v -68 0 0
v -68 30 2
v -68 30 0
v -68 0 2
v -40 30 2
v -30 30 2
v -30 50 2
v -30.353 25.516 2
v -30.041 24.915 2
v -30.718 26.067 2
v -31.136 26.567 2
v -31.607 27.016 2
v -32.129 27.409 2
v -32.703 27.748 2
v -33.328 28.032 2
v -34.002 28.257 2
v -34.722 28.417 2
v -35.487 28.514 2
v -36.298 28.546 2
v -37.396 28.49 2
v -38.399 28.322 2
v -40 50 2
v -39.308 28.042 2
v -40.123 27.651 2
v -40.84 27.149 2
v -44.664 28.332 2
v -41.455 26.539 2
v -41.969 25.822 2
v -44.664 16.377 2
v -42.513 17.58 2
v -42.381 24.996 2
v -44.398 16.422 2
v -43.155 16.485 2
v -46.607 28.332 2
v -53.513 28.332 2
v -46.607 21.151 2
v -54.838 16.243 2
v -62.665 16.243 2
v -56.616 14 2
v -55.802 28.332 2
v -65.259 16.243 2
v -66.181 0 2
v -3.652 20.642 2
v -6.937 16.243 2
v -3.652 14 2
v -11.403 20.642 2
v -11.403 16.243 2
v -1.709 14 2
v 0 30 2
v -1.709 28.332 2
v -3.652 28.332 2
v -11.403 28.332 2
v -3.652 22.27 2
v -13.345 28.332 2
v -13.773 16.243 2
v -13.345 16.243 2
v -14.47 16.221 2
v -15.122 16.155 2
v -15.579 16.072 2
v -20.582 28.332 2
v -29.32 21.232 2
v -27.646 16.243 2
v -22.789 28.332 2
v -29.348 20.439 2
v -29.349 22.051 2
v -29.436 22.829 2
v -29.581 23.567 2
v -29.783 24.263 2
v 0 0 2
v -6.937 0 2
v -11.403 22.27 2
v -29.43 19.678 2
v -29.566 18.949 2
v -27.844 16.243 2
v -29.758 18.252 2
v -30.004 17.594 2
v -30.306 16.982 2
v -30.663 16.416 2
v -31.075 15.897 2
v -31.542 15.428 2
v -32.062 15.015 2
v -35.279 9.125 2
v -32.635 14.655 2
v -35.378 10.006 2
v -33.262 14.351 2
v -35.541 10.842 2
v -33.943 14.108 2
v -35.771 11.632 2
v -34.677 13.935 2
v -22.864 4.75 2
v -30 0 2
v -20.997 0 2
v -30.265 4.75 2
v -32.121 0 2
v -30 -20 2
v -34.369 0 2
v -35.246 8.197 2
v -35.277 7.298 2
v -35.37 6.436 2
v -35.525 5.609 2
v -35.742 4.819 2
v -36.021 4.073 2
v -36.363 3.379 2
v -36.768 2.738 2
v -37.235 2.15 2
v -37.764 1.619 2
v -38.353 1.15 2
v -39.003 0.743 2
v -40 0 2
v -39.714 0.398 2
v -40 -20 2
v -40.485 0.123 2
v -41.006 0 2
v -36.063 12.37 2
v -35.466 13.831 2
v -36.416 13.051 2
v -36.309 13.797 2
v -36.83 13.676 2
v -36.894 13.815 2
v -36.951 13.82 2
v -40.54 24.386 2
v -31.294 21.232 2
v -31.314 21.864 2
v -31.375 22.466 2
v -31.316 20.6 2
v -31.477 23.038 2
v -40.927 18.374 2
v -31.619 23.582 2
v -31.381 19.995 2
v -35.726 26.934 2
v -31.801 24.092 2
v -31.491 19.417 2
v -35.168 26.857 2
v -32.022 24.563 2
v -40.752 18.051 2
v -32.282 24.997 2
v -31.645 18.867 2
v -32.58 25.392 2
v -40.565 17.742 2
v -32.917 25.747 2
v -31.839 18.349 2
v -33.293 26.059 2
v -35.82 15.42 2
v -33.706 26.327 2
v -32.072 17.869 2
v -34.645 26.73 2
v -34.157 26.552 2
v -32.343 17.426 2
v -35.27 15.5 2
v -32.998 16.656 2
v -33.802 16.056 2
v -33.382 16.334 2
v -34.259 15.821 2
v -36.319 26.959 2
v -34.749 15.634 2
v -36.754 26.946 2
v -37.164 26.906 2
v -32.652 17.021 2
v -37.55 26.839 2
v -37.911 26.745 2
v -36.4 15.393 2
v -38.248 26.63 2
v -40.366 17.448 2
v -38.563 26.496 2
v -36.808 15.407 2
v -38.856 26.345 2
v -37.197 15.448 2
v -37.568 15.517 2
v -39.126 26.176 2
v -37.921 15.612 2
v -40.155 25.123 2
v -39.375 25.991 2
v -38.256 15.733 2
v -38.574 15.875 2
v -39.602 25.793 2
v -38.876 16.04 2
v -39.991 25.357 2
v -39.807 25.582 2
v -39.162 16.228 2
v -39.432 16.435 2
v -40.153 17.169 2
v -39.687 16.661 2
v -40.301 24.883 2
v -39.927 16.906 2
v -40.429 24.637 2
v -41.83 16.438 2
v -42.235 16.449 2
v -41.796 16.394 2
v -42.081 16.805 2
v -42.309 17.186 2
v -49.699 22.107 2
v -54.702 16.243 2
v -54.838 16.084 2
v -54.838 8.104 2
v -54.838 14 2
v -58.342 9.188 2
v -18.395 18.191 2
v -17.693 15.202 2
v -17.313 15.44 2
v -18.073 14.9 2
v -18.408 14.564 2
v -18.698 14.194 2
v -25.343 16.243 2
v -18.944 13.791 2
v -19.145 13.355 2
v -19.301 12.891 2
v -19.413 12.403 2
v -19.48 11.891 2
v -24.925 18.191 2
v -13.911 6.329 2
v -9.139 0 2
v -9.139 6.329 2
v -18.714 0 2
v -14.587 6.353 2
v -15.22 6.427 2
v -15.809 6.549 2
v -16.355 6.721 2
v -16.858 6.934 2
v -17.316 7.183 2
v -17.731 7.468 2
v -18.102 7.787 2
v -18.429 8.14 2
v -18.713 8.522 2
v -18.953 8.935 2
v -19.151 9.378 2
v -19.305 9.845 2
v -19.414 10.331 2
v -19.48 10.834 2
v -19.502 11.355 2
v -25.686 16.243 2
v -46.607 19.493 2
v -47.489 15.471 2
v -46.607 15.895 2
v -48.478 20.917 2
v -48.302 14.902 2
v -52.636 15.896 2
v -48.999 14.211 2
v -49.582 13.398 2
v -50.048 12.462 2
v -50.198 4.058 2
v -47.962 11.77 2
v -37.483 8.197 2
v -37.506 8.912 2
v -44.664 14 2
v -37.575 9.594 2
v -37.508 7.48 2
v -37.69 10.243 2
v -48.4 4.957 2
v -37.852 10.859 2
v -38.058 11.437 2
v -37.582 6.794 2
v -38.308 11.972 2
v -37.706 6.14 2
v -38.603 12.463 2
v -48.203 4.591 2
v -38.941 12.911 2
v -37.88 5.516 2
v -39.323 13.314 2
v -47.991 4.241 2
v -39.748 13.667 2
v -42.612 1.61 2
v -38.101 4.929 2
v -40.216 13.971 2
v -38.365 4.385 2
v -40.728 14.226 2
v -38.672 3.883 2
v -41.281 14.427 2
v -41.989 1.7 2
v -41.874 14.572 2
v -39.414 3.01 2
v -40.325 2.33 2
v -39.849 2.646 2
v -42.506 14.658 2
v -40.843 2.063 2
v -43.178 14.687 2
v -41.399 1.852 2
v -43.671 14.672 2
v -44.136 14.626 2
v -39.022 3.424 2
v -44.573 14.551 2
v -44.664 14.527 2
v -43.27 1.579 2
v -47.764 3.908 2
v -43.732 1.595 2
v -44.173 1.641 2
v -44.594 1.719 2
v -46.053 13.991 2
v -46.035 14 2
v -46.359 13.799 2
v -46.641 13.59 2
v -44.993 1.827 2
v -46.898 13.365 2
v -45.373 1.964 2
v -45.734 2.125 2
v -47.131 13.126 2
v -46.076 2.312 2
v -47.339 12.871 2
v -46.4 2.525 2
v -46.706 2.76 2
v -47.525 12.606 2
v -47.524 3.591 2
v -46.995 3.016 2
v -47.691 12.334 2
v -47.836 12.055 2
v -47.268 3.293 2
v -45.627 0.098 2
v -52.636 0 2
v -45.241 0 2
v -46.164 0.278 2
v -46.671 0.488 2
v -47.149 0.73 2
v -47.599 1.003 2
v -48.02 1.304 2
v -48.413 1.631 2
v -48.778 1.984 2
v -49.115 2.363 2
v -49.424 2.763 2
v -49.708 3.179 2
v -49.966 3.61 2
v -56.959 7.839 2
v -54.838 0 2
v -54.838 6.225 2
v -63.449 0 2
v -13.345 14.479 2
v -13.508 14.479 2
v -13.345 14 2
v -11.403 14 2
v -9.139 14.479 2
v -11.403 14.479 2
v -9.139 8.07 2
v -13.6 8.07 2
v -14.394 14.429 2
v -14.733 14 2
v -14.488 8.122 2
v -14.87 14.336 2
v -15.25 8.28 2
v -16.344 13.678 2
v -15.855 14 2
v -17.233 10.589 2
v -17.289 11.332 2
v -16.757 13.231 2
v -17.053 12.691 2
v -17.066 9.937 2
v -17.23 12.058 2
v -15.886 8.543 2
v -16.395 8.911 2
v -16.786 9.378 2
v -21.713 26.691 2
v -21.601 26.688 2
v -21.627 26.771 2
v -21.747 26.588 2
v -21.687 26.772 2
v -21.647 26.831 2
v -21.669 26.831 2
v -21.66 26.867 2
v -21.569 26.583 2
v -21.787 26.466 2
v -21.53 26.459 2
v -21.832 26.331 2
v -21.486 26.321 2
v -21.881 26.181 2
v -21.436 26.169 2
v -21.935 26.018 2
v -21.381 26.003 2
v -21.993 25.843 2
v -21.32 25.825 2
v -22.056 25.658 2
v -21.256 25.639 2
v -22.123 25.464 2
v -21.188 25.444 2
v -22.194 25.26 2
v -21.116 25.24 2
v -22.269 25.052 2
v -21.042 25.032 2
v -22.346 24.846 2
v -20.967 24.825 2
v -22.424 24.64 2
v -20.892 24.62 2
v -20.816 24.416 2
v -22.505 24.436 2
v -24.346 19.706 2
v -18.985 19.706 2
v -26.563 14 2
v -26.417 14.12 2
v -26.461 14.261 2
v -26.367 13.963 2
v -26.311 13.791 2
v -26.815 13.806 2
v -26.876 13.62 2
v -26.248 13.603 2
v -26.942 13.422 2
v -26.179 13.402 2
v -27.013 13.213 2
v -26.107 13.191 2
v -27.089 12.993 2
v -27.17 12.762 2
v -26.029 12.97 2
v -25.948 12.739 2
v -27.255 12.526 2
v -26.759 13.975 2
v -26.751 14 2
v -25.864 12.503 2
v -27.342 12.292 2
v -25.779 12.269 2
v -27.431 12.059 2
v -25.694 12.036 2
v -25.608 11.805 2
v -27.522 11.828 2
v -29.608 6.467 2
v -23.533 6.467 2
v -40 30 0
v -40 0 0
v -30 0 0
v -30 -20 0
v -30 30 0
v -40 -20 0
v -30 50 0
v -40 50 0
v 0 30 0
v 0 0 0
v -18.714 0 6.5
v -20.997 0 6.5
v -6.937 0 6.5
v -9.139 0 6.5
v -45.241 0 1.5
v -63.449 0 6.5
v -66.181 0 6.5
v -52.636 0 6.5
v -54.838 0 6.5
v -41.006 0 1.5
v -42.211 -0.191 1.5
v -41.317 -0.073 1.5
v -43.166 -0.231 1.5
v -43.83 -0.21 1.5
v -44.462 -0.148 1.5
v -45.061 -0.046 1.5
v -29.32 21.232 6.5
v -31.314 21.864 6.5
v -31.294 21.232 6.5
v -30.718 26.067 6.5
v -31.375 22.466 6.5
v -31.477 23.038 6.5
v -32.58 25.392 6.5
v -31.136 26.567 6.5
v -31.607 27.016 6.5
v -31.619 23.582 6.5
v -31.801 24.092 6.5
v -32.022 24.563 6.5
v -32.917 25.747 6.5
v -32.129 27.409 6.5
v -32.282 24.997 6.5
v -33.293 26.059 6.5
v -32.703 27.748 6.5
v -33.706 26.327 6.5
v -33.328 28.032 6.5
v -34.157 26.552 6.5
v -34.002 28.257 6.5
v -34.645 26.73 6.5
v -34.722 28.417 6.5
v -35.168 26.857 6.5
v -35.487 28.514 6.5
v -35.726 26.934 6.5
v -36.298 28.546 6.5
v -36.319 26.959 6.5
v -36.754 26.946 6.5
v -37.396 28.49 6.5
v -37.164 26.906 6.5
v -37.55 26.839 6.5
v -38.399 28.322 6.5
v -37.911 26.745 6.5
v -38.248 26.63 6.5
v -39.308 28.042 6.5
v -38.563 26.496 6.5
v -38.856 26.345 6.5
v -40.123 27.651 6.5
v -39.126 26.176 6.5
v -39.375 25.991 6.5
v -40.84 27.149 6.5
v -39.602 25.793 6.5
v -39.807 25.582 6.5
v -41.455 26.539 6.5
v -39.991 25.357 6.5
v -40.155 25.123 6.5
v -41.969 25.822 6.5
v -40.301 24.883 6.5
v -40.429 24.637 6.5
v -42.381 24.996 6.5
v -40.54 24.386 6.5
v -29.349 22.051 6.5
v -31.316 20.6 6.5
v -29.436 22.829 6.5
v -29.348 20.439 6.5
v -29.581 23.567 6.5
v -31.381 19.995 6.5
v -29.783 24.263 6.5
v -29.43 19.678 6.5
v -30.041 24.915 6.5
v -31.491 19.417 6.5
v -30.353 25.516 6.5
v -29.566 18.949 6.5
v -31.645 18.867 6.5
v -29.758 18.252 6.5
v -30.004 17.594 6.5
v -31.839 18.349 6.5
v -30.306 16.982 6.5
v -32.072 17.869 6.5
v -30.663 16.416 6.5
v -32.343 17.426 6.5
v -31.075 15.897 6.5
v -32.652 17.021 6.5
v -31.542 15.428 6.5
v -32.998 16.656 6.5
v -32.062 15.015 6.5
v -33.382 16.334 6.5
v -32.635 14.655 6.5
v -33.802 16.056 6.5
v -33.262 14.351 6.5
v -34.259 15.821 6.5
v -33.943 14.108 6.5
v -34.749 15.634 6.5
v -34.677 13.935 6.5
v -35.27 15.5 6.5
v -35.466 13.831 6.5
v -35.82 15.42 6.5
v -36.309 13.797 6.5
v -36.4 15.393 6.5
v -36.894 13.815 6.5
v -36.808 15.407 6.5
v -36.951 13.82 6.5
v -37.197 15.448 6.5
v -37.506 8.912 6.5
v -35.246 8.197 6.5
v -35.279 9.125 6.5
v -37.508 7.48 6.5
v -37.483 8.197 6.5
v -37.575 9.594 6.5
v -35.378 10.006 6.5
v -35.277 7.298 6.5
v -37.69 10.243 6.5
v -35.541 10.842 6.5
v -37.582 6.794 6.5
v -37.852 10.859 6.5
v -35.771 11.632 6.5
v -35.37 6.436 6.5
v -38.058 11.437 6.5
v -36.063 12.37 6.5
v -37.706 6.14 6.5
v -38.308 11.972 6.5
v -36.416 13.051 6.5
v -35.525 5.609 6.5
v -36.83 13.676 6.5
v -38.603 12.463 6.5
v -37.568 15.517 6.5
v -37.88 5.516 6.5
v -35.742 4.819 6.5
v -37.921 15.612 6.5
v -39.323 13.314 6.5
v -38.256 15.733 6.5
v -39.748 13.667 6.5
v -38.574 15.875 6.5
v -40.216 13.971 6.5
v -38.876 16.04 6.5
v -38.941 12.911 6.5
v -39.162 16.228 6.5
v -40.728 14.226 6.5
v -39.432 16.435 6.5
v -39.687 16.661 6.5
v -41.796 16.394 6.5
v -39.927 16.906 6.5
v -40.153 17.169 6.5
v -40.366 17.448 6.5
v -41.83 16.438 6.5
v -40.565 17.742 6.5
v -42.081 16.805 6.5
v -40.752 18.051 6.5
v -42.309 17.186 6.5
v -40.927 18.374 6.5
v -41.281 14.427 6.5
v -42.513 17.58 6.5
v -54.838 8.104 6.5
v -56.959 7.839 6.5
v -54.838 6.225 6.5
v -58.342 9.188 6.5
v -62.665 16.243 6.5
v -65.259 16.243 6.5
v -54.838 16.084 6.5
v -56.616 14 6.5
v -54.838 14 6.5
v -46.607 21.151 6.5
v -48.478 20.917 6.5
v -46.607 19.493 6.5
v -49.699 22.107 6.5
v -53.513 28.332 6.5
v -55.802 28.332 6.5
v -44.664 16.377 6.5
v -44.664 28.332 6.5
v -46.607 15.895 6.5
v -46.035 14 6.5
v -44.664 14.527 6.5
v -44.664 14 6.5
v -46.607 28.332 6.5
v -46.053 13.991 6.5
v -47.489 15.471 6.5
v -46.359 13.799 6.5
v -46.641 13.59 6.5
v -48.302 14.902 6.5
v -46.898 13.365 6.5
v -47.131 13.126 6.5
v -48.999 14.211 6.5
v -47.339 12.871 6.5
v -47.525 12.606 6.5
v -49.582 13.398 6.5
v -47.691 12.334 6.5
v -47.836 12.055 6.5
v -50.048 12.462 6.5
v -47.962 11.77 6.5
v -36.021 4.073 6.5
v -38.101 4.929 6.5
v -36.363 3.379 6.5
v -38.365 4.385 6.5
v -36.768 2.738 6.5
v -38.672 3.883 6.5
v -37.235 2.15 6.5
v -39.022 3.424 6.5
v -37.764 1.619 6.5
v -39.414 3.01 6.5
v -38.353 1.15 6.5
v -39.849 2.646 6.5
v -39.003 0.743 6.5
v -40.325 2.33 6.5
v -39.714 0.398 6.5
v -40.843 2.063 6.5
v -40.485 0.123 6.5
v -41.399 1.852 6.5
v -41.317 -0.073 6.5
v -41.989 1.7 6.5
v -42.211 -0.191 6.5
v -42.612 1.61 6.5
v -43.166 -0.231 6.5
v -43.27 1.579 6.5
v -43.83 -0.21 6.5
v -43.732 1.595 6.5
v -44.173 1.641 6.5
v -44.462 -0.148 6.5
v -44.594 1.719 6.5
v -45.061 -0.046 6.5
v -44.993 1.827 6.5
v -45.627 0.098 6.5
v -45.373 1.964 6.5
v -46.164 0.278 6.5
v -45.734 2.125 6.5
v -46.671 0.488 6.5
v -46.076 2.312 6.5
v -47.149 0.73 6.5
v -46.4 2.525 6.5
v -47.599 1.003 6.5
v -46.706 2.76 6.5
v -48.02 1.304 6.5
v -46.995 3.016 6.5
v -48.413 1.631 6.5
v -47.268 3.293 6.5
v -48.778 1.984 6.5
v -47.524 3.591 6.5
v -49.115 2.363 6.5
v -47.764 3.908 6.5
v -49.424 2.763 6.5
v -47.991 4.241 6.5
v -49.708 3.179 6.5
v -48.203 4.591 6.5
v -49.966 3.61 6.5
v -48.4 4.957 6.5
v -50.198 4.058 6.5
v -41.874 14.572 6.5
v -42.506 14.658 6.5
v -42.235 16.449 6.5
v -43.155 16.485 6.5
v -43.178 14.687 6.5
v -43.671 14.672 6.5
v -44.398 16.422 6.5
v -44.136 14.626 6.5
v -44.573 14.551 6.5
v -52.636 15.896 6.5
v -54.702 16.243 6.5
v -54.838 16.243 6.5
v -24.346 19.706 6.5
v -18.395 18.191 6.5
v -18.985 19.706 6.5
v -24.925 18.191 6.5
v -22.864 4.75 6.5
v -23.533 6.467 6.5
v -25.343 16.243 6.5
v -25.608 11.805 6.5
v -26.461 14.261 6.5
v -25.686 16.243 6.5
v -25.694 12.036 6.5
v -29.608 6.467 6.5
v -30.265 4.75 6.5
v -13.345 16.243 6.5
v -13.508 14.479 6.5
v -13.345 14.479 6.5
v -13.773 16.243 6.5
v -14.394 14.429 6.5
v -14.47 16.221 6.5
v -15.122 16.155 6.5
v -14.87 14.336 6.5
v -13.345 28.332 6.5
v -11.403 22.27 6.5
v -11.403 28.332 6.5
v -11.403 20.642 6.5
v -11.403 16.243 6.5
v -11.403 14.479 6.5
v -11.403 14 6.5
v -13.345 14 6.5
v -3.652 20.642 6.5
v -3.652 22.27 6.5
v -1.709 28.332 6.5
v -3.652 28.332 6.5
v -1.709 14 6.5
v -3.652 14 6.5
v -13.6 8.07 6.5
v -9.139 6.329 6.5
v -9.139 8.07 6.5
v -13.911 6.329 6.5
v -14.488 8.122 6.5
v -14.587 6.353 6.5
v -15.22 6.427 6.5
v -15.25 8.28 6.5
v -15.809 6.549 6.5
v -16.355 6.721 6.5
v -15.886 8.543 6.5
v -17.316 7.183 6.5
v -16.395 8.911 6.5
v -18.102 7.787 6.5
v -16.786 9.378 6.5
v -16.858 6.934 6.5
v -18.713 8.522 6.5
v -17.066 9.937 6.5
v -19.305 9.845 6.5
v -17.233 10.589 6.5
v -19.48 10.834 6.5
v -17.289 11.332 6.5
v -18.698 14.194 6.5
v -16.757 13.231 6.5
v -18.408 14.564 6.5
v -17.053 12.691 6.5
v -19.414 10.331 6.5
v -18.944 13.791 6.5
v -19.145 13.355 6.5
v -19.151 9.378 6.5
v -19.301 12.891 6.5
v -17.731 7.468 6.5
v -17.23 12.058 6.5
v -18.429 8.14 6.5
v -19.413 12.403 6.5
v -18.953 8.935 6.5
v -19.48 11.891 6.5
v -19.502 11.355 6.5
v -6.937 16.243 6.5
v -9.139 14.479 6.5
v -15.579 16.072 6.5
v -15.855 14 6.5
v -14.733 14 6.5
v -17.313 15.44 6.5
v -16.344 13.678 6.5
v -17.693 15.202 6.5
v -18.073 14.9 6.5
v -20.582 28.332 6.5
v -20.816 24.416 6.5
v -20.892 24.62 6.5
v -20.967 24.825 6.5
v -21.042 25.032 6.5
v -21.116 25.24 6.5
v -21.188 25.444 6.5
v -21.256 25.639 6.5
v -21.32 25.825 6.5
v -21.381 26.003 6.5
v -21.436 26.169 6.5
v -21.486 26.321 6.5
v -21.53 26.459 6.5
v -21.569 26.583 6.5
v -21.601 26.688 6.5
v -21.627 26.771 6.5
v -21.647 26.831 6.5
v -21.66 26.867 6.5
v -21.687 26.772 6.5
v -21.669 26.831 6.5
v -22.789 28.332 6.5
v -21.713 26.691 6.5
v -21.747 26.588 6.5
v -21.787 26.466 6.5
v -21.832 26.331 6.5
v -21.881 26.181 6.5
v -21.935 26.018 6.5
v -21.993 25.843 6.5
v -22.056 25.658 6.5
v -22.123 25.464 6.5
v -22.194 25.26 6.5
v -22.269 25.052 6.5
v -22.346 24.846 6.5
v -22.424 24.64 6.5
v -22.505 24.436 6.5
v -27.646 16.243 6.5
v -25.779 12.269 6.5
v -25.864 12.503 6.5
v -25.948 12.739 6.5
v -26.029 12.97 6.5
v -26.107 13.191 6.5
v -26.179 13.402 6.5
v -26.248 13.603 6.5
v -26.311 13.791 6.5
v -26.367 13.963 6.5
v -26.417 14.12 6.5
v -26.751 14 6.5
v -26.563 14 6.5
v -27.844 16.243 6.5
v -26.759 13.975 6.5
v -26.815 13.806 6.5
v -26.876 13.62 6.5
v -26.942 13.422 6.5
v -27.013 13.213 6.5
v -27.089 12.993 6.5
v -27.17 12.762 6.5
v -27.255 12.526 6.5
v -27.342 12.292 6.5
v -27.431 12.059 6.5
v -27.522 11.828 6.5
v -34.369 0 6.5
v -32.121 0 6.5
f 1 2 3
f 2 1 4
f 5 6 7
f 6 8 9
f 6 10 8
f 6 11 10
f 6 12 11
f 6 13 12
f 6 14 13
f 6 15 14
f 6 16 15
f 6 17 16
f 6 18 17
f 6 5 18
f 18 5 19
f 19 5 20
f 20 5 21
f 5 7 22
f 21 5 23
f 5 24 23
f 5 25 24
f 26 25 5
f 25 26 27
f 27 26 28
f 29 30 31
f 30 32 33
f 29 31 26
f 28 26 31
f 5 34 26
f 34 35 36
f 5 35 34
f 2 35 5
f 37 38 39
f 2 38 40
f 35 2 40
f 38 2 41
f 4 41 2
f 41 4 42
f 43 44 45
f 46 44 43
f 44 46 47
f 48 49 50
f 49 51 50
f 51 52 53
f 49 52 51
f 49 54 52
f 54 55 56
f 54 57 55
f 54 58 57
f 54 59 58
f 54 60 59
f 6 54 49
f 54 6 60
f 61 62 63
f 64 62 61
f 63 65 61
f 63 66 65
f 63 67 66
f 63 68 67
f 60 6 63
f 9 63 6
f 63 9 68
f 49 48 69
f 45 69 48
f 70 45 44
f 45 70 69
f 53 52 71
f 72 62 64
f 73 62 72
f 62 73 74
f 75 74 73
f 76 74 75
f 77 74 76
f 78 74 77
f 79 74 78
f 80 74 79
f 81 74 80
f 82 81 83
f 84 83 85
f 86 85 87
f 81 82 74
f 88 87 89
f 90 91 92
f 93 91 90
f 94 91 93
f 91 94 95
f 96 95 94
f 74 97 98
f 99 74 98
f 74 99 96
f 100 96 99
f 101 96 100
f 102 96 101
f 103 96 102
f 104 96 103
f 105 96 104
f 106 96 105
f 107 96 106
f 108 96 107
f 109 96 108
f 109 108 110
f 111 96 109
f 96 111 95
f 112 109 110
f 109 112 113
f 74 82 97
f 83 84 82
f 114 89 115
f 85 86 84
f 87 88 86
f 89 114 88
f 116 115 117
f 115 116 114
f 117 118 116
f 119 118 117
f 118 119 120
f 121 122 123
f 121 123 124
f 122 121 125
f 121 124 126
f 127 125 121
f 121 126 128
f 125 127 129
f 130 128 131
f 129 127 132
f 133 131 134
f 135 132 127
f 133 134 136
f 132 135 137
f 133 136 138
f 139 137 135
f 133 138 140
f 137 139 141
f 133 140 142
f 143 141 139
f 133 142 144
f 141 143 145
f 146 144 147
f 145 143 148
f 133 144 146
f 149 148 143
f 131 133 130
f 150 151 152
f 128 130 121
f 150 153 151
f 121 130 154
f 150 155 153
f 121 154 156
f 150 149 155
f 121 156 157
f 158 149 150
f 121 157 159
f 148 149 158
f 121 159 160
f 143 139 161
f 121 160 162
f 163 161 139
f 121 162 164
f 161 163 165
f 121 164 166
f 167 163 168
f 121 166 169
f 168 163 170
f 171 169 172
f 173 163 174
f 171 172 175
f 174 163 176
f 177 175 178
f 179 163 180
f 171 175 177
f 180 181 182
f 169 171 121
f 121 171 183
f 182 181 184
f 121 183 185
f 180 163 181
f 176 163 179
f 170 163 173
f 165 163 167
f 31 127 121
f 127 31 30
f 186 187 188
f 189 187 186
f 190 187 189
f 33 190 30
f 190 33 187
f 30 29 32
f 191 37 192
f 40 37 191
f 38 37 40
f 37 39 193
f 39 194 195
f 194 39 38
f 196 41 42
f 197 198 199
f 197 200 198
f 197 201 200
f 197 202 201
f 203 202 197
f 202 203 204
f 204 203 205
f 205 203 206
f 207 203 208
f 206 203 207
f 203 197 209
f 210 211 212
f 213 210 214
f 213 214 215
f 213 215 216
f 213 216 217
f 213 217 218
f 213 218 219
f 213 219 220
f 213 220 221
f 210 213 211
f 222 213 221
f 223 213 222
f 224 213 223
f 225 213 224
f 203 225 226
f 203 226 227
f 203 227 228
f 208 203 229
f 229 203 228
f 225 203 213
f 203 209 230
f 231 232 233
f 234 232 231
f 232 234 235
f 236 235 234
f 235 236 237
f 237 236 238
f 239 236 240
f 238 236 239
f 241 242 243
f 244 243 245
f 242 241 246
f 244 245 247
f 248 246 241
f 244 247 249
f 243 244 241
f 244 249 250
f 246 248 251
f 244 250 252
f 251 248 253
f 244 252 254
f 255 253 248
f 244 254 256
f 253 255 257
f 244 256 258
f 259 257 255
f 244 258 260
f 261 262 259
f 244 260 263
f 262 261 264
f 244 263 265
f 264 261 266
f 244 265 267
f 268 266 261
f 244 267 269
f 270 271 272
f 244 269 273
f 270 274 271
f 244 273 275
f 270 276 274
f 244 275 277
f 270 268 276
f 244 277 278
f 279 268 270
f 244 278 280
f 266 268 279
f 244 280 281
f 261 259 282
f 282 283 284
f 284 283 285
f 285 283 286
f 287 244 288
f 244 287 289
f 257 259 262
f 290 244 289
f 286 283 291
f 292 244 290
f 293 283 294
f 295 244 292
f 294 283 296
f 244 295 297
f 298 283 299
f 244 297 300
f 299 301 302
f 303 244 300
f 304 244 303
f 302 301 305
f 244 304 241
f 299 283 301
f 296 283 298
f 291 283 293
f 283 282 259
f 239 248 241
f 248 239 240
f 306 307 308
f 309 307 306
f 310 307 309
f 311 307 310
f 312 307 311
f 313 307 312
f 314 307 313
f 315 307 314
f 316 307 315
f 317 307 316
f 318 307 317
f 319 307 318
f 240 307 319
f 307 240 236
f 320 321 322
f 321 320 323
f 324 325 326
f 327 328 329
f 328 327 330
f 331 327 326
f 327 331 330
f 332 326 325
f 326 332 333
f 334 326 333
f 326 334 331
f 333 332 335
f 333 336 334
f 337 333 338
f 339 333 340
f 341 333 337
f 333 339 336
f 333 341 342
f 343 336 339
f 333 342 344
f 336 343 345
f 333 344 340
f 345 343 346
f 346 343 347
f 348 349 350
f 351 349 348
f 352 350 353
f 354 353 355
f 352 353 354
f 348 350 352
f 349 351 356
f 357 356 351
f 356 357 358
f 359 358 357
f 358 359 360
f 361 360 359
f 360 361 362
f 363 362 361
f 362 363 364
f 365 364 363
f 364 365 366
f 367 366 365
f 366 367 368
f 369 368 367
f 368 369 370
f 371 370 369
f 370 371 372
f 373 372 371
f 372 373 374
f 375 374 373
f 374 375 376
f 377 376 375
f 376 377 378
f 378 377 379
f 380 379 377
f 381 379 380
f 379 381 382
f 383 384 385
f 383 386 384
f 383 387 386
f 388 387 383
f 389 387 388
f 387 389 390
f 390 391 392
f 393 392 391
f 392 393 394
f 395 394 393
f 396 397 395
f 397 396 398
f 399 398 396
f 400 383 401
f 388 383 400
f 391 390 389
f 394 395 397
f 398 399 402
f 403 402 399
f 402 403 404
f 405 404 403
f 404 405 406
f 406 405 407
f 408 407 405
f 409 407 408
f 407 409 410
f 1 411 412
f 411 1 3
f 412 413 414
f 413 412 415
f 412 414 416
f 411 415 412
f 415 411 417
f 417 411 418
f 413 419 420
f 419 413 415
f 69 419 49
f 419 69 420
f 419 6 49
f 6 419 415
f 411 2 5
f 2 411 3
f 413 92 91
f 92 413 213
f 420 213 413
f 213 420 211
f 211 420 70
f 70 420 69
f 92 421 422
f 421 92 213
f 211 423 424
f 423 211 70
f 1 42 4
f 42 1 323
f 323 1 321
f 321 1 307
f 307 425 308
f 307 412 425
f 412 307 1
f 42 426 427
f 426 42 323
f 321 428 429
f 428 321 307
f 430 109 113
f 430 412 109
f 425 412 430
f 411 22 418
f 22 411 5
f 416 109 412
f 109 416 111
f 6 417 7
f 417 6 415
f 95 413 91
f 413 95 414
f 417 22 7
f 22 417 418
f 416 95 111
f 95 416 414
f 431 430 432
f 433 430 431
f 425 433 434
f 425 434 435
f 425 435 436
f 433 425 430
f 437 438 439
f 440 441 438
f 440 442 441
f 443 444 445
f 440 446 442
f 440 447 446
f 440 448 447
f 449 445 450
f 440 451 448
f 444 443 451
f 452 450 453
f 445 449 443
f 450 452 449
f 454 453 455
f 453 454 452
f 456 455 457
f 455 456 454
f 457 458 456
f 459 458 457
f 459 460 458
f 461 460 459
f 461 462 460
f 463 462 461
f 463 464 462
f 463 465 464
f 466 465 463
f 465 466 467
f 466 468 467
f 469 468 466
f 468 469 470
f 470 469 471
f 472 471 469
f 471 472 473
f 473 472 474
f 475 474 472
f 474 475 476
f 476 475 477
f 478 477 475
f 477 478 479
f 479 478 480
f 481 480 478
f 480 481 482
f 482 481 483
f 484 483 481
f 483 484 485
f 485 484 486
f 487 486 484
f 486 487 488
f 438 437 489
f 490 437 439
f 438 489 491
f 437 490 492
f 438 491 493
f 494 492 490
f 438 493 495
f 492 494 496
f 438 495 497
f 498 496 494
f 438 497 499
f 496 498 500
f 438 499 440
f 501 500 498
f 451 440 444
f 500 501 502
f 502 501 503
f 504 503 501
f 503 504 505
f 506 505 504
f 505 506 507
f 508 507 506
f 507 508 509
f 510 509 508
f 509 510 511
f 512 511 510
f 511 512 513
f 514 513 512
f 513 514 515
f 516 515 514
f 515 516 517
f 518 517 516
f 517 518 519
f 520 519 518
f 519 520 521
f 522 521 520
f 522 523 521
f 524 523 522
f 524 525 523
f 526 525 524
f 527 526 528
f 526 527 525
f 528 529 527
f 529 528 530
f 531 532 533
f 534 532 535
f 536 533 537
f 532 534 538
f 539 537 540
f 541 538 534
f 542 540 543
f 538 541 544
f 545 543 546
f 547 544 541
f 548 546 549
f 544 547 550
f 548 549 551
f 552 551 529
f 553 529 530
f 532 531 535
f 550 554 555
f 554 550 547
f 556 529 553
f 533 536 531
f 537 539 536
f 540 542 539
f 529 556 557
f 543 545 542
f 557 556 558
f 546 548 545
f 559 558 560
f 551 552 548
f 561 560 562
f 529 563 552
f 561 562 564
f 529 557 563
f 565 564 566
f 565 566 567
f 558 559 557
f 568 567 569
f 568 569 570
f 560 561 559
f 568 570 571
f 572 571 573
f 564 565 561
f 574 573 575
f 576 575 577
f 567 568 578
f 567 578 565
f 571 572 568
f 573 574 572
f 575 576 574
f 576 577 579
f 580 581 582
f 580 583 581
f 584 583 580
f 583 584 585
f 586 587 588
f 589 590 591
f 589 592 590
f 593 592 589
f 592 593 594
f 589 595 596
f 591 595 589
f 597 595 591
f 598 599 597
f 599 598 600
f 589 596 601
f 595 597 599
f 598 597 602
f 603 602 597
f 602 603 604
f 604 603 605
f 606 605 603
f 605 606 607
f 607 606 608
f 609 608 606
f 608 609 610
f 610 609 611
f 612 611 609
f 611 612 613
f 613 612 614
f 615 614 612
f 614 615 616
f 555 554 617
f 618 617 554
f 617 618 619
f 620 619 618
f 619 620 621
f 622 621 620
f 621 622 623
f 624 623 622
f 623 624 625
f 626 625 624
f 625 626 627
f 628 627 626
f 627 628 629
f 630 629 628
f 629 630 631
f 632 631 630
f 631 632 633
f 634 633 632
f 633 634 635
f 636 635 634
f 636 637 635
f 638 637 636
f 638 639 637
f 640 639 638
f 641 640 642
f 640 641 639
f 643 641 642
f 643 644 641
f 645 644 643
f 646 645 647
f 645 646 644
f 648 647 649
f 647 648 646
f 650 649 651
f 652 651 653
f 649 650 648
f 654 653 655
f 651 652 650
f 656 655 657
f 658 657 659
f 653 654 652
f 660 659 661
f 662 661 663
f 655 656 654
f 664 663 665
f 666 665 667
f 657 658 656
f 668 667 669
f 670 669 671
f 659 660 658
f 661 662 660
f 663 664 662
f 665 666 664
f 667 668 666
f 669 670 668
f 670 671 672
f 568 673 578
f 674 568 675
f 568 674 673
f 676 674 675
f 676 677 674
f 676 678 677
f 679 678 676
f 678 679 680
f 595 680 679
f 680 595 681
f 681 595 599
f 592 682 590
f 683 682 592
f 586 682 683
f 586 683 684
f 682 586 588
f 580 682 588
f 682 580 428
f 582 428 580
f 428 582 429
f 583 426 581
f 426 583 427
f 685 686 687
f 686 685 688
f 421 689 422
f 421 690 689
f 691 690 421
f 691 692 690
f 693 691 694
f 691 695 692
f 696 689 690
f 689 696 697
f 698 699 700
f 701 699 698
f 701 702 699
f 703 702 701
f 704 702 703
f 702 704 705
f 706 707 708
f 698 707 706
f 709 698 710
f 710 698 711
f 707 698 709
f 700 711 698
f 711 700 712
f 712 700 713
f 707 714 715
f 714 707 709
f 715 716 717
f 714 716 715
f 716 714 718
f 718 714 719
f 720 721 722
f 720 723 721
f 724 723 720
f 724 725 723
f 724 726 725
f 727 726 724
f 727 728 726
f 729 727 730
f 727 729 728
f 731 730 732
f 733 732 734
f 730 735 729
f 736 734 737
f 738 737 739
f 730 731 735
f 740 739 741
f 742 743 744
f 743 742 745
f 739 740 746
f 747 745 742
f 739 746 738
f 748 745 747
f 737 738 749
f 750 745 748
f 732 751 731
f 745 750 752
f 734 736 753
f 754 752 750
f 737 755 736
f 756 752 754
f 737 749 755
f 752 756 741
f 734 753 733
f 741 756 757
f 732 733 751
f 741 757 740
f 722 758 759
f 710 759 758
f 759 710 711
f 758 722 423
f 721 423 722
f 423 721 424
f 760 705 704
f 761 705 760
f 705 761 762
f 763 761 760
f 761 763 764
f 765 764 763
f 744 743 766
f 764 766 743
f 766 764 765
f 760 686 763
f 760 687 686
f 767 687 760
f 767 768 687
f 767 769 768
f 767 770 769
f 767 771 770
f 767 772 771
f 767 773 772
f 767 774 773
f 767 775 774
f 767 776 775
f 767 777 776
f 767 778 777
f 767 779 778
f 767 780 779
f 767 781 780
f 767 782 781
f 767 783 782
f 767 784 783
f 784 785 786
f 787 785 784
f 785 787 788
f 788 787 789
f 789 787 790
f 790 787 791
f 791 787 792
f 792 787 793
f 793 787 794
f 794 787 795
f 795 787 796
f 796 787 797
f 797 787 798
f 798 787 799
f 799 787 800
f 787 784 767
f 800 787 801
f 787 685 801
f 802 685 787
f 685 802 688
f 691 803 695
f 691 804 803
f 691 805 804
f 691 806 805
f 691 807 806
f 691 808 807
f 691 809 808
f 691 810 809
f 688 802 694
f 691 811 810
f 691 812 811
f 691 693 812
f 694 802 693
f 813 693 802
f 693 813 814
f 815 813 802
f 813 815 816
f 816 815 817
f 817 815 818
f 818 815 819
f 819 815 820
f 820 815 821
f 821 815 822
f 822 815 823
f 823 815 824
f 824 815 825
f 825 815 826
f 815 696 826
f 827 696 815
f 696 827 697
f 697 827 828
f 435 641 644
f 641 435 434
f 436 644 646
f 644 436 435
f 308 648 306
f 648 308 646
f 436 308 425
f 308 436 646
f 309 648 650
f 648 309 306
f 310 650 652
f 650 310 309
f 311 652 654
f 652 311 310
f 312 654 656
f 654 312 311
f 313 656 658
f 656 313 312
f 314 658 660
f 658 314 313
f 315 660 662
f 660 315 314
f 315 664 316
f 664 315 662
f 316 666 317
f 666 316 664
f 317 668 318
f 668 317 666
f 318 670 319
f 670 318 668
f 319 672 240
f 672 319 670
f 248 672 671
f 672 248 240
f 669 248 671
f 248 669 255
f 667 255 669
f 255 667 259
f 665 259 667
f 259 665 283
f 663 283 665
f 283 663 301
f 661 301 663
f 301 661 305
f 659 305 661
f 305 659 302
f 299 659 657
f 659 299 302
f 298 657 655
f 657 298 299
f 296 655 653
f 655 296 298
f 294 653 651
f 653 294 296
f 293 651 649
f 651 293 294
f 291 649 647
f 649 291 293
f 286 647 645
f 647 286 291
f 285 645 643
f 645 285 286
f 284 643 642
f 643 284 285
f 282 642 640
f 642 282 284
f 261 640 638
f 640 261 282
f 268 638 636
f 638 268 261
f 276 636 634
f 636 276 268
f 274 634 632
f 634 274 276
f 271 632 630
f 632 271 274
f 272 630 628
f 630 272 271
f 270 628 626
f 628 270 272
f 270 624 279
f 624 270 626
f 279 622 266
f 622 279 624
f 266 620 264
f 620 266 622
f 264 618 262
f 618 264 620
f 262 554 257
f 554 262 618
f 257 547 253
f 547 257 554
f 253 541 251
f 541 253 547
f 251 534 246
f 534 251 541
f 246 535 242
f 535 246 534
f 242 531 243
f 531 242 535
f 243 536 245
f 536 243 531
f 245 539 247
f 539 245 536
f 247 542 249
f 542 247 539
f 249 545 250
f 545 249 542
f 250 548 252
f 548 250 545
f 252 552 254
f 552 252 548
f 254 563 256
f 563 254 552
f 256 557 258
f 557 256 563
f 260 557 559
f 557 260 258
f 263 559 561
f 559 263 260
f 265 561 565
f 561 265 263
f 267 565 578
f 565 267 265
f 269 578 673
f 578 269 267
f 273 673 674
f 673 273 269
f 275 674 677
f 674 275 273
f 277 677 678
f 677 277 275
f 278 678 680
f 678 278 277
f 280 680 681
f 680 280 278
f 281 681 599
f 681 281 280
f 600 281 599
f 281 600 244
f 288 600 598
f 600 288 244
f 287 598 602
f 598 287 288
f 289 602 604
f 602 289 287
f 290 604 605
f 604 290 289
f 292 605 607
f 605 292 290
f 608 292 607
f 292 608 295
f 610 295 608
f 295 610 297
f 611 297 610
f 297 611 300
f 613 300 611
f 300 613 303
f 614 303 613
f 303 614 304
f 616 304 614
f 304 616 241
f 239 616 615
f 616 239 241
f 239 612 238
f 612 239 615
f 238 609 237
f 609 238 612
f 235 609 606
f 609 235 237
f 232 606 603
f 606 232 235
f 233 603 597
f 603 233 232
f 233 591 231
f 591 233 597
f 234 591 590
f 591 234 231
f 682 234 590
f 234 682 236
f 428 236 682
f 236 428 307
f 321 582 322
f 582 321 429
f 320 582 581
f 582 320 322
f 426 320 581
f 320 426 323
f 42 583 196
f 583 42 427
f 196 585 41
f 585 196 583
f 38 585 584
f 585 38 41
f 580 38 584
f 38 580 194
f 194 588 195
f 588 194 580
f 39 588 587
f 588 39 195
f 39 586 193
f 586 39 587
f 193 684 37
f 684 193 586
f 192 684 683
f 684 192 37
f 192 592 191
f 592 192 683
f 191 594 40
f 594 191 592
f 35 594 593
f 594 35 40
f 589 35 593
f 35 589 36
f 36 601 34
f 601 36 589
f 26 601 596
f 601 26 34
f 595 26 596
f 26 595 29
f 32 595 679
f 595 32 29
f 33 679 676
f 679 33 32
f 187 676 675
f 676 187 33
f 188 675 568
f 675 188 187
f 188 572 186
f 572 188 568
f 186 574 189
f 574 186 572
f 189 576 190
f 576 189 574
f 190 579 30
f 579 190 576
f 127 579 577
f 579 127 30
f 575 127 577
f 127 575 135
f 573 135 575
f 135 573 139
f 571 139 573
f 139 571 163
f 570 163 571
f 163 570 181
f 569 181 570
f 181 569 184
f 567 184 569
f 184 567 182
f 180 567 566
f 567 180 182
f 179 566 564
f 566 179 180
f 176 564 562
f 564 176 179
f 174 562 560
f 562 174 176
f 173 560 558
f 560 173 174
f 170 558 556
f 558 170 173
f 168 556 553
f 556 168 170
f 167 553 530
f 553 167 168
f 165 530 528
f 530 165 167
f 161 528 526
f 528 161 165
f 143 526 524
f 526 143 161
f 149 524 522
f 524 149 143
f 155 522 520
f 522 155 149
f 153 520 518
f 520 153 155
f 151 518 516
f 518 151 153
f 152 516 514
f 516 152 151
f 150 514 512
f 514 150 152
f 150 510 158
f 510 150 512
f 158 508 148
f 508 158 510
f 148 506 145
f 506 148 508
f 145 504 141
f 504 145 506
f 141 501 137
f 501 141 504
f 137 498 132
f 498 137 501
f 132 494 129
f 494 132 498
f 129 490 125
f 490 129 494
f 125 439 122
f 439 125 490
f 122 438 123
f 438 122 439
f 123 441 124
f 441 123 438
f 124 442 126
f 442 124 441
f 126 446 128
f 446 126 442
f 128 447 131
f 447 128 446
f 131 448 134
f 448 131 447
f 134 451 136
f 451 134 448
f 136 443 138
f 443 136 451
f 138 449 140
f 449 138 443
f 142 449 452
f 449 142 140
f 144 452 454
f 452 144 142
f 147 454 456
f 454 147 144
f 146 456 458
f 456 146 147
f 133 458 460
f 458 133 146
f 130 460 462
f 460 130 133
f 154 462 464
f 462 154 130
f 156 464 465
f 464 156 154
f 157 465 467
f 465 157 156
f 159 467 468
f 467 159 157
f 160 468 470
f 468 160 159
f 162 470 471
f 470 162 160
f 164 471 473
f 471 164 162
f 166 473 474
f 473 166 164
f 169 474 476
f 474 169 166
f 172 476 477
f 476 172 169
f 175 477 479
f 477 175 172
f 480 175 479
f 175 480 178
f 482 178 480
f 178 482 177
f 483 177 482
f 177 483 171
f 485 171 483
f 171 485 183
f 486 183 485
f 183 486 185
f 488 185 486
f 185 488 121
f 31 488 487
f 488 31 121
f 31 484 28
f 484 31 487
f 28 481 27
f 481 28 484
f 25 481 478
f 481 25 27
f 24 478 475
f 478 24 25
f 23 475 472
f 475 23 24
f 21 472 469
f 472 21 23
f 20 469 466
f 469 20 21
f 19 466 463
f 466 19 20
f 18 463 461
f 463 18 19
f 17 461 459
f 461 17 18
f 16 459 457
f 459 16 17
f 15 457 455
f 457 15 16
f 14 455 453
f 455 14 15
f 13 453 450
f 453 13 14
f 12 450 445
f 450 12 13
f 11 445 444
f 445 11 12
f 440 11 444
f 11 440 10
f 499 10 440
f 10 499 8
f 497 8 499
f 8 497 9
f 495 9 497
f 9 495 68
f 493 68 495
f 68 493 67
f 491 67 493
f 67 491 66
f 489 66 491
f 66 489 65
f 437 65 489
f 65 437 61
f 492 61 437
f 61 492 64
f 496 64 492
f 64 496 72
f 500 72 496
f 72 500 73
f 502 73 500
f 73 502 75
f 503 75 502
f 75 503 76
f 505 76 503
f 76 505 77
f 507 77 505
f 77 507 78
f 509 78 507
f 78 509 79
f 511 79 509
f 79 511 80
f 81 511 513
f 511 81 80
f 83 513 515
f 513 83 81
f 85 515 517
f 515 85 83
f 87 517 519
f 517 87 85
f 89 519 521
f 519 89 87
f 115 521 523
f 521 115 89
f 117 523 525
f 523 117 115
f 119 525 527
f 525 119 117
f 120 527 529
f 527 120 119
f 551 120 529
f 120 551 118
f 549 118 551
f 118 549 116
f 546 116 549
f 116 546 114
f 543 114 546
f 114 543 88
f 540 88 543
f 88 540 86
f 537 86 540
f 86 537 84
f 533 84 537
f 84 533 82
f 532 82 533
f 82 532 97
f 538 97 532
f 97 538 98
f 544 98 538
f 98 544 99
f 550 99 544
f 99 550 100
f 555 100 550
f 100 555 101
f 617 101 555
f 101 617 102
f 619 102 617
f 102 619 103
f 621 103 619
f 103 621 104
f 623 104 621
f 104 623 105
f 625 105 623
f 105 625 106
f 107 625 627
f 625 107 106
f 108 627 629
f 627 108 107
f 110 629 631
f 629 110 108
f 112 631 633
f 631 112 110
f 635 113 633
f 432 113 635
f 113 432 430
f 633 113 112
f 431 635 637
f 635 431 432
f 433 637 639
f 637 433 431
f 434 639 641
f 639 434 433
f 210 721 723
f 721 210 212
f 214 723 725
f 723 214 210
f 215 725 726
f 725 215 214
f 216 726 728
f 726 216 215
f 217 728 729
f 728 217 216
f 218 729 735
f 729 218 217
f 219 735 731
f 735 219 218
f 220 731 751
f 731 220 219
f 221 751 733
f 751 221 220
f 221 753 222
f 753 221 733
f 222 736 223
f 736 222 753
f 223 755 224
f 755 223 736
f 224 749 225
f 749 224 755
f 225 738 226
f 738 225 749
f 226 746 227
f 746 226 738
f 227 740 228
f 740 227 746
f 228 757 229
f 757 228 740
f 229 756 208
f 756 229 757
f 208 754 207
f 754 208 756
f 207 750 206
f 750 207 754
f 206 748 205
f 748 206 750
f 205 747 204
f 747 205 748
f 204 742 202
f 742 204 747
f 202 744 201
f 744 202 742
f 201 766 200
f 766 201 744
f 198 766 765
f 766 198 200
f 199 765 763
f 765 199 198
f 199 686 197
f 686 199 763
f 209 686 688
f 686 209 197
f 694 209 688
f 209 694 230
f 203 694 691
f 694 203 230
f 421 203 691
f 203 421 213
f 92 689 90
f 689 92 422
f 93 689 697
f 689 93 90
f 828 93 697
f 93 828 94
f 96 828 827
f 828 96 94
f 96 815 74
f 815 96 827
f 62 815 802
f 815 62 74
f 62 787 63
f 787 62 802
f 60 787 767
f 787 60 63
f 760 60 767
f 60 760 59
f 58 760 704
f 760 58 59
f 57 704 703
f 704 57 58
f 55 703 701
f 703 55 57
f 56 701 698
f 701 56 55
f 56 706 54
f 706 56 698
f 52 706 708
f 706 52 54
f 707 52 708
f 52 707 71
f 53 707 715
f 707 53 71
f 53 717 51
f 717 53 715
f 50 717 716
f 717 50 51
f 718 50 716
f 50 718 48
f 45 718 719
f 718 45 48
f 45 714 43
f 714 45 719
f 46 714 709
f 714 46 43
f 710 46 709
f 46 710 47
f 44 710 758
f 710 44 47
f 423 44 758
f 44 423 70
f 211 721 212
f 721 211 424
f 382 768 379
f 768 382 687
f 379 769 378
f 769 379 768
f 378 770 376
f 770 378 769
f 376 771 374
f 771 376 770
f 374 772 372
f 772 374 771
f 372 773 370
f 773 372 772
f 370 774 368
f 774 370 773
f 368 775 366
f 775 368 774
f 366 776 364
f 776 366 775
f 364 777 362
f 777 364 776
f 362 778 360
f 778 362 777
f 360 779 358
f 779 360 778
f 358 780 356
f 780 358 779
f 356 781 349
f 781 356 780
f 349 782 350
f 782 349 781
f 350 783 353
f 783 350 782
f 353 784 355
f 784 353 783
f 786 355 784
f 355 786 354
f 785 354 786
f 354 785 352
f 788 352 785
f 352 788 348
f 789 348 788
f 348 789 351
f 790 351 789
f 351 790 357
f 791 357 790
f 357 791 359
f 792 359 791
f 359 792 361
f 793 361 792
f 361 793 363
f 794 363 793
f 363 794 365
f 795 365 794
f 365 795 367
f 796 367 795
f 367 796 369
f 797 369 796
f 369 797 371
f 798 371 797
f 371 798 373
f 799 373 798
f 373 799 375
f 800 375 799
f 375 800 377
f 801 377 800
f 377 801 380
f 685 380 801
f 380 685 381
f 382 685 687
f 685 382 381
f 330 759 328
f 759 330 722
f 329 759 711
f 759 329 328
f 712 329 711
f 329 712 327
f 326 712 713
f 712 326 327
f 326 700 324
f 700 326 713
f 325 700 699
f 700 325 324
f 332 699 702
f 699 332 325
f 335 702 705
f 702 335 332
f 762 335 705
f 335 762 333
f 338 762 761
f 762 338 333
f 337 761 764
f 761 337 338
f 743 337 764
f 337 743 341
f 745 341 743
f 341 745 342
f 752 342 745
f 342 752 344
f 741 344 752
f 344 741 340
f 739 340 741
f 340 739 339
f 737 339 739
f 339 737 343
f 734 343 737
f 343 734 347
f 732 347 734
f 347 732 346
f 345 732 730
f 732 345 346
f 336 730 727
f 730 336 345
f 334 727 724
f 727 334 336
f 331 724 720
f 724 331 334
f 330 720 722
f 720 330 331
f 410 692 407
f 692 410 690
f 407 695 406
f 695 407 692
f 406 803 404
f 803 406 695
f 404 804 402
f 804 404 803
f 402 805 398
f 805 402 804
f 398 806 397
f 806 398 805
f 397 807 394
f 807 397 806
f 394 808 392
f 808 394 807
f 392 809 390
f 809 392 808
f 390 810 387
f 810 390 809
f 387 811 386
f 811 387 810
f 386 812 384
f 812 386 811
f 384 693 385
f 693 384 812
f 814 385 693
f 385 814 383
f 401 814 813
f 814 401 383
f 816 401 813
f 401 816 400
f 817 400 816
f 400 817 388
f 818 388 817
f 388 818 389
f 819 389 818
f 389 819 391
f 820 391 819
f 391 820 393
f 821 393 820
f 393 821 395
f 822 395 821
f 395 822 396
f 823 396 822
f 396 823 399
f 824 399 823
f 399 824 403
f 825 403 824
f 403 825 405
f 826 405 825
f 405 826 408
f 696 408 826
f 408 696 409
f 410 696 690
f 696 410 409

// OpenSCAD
// ink pad is 2.75" x 4.25"
// 69.85mm x 107.95mm

mirror([1, 0, 0]) {
cube([68, 30, 2]);
translate([30, -20, 0])
  cube([10, 70, 2]);

translate([0, 0, 1.5])
  linear_extrude(5) {
    translate([0, 14, 0])
      text("HACK", 15);
    translate([5, 0, 0])
      text("PACK", 17);
  }
}
